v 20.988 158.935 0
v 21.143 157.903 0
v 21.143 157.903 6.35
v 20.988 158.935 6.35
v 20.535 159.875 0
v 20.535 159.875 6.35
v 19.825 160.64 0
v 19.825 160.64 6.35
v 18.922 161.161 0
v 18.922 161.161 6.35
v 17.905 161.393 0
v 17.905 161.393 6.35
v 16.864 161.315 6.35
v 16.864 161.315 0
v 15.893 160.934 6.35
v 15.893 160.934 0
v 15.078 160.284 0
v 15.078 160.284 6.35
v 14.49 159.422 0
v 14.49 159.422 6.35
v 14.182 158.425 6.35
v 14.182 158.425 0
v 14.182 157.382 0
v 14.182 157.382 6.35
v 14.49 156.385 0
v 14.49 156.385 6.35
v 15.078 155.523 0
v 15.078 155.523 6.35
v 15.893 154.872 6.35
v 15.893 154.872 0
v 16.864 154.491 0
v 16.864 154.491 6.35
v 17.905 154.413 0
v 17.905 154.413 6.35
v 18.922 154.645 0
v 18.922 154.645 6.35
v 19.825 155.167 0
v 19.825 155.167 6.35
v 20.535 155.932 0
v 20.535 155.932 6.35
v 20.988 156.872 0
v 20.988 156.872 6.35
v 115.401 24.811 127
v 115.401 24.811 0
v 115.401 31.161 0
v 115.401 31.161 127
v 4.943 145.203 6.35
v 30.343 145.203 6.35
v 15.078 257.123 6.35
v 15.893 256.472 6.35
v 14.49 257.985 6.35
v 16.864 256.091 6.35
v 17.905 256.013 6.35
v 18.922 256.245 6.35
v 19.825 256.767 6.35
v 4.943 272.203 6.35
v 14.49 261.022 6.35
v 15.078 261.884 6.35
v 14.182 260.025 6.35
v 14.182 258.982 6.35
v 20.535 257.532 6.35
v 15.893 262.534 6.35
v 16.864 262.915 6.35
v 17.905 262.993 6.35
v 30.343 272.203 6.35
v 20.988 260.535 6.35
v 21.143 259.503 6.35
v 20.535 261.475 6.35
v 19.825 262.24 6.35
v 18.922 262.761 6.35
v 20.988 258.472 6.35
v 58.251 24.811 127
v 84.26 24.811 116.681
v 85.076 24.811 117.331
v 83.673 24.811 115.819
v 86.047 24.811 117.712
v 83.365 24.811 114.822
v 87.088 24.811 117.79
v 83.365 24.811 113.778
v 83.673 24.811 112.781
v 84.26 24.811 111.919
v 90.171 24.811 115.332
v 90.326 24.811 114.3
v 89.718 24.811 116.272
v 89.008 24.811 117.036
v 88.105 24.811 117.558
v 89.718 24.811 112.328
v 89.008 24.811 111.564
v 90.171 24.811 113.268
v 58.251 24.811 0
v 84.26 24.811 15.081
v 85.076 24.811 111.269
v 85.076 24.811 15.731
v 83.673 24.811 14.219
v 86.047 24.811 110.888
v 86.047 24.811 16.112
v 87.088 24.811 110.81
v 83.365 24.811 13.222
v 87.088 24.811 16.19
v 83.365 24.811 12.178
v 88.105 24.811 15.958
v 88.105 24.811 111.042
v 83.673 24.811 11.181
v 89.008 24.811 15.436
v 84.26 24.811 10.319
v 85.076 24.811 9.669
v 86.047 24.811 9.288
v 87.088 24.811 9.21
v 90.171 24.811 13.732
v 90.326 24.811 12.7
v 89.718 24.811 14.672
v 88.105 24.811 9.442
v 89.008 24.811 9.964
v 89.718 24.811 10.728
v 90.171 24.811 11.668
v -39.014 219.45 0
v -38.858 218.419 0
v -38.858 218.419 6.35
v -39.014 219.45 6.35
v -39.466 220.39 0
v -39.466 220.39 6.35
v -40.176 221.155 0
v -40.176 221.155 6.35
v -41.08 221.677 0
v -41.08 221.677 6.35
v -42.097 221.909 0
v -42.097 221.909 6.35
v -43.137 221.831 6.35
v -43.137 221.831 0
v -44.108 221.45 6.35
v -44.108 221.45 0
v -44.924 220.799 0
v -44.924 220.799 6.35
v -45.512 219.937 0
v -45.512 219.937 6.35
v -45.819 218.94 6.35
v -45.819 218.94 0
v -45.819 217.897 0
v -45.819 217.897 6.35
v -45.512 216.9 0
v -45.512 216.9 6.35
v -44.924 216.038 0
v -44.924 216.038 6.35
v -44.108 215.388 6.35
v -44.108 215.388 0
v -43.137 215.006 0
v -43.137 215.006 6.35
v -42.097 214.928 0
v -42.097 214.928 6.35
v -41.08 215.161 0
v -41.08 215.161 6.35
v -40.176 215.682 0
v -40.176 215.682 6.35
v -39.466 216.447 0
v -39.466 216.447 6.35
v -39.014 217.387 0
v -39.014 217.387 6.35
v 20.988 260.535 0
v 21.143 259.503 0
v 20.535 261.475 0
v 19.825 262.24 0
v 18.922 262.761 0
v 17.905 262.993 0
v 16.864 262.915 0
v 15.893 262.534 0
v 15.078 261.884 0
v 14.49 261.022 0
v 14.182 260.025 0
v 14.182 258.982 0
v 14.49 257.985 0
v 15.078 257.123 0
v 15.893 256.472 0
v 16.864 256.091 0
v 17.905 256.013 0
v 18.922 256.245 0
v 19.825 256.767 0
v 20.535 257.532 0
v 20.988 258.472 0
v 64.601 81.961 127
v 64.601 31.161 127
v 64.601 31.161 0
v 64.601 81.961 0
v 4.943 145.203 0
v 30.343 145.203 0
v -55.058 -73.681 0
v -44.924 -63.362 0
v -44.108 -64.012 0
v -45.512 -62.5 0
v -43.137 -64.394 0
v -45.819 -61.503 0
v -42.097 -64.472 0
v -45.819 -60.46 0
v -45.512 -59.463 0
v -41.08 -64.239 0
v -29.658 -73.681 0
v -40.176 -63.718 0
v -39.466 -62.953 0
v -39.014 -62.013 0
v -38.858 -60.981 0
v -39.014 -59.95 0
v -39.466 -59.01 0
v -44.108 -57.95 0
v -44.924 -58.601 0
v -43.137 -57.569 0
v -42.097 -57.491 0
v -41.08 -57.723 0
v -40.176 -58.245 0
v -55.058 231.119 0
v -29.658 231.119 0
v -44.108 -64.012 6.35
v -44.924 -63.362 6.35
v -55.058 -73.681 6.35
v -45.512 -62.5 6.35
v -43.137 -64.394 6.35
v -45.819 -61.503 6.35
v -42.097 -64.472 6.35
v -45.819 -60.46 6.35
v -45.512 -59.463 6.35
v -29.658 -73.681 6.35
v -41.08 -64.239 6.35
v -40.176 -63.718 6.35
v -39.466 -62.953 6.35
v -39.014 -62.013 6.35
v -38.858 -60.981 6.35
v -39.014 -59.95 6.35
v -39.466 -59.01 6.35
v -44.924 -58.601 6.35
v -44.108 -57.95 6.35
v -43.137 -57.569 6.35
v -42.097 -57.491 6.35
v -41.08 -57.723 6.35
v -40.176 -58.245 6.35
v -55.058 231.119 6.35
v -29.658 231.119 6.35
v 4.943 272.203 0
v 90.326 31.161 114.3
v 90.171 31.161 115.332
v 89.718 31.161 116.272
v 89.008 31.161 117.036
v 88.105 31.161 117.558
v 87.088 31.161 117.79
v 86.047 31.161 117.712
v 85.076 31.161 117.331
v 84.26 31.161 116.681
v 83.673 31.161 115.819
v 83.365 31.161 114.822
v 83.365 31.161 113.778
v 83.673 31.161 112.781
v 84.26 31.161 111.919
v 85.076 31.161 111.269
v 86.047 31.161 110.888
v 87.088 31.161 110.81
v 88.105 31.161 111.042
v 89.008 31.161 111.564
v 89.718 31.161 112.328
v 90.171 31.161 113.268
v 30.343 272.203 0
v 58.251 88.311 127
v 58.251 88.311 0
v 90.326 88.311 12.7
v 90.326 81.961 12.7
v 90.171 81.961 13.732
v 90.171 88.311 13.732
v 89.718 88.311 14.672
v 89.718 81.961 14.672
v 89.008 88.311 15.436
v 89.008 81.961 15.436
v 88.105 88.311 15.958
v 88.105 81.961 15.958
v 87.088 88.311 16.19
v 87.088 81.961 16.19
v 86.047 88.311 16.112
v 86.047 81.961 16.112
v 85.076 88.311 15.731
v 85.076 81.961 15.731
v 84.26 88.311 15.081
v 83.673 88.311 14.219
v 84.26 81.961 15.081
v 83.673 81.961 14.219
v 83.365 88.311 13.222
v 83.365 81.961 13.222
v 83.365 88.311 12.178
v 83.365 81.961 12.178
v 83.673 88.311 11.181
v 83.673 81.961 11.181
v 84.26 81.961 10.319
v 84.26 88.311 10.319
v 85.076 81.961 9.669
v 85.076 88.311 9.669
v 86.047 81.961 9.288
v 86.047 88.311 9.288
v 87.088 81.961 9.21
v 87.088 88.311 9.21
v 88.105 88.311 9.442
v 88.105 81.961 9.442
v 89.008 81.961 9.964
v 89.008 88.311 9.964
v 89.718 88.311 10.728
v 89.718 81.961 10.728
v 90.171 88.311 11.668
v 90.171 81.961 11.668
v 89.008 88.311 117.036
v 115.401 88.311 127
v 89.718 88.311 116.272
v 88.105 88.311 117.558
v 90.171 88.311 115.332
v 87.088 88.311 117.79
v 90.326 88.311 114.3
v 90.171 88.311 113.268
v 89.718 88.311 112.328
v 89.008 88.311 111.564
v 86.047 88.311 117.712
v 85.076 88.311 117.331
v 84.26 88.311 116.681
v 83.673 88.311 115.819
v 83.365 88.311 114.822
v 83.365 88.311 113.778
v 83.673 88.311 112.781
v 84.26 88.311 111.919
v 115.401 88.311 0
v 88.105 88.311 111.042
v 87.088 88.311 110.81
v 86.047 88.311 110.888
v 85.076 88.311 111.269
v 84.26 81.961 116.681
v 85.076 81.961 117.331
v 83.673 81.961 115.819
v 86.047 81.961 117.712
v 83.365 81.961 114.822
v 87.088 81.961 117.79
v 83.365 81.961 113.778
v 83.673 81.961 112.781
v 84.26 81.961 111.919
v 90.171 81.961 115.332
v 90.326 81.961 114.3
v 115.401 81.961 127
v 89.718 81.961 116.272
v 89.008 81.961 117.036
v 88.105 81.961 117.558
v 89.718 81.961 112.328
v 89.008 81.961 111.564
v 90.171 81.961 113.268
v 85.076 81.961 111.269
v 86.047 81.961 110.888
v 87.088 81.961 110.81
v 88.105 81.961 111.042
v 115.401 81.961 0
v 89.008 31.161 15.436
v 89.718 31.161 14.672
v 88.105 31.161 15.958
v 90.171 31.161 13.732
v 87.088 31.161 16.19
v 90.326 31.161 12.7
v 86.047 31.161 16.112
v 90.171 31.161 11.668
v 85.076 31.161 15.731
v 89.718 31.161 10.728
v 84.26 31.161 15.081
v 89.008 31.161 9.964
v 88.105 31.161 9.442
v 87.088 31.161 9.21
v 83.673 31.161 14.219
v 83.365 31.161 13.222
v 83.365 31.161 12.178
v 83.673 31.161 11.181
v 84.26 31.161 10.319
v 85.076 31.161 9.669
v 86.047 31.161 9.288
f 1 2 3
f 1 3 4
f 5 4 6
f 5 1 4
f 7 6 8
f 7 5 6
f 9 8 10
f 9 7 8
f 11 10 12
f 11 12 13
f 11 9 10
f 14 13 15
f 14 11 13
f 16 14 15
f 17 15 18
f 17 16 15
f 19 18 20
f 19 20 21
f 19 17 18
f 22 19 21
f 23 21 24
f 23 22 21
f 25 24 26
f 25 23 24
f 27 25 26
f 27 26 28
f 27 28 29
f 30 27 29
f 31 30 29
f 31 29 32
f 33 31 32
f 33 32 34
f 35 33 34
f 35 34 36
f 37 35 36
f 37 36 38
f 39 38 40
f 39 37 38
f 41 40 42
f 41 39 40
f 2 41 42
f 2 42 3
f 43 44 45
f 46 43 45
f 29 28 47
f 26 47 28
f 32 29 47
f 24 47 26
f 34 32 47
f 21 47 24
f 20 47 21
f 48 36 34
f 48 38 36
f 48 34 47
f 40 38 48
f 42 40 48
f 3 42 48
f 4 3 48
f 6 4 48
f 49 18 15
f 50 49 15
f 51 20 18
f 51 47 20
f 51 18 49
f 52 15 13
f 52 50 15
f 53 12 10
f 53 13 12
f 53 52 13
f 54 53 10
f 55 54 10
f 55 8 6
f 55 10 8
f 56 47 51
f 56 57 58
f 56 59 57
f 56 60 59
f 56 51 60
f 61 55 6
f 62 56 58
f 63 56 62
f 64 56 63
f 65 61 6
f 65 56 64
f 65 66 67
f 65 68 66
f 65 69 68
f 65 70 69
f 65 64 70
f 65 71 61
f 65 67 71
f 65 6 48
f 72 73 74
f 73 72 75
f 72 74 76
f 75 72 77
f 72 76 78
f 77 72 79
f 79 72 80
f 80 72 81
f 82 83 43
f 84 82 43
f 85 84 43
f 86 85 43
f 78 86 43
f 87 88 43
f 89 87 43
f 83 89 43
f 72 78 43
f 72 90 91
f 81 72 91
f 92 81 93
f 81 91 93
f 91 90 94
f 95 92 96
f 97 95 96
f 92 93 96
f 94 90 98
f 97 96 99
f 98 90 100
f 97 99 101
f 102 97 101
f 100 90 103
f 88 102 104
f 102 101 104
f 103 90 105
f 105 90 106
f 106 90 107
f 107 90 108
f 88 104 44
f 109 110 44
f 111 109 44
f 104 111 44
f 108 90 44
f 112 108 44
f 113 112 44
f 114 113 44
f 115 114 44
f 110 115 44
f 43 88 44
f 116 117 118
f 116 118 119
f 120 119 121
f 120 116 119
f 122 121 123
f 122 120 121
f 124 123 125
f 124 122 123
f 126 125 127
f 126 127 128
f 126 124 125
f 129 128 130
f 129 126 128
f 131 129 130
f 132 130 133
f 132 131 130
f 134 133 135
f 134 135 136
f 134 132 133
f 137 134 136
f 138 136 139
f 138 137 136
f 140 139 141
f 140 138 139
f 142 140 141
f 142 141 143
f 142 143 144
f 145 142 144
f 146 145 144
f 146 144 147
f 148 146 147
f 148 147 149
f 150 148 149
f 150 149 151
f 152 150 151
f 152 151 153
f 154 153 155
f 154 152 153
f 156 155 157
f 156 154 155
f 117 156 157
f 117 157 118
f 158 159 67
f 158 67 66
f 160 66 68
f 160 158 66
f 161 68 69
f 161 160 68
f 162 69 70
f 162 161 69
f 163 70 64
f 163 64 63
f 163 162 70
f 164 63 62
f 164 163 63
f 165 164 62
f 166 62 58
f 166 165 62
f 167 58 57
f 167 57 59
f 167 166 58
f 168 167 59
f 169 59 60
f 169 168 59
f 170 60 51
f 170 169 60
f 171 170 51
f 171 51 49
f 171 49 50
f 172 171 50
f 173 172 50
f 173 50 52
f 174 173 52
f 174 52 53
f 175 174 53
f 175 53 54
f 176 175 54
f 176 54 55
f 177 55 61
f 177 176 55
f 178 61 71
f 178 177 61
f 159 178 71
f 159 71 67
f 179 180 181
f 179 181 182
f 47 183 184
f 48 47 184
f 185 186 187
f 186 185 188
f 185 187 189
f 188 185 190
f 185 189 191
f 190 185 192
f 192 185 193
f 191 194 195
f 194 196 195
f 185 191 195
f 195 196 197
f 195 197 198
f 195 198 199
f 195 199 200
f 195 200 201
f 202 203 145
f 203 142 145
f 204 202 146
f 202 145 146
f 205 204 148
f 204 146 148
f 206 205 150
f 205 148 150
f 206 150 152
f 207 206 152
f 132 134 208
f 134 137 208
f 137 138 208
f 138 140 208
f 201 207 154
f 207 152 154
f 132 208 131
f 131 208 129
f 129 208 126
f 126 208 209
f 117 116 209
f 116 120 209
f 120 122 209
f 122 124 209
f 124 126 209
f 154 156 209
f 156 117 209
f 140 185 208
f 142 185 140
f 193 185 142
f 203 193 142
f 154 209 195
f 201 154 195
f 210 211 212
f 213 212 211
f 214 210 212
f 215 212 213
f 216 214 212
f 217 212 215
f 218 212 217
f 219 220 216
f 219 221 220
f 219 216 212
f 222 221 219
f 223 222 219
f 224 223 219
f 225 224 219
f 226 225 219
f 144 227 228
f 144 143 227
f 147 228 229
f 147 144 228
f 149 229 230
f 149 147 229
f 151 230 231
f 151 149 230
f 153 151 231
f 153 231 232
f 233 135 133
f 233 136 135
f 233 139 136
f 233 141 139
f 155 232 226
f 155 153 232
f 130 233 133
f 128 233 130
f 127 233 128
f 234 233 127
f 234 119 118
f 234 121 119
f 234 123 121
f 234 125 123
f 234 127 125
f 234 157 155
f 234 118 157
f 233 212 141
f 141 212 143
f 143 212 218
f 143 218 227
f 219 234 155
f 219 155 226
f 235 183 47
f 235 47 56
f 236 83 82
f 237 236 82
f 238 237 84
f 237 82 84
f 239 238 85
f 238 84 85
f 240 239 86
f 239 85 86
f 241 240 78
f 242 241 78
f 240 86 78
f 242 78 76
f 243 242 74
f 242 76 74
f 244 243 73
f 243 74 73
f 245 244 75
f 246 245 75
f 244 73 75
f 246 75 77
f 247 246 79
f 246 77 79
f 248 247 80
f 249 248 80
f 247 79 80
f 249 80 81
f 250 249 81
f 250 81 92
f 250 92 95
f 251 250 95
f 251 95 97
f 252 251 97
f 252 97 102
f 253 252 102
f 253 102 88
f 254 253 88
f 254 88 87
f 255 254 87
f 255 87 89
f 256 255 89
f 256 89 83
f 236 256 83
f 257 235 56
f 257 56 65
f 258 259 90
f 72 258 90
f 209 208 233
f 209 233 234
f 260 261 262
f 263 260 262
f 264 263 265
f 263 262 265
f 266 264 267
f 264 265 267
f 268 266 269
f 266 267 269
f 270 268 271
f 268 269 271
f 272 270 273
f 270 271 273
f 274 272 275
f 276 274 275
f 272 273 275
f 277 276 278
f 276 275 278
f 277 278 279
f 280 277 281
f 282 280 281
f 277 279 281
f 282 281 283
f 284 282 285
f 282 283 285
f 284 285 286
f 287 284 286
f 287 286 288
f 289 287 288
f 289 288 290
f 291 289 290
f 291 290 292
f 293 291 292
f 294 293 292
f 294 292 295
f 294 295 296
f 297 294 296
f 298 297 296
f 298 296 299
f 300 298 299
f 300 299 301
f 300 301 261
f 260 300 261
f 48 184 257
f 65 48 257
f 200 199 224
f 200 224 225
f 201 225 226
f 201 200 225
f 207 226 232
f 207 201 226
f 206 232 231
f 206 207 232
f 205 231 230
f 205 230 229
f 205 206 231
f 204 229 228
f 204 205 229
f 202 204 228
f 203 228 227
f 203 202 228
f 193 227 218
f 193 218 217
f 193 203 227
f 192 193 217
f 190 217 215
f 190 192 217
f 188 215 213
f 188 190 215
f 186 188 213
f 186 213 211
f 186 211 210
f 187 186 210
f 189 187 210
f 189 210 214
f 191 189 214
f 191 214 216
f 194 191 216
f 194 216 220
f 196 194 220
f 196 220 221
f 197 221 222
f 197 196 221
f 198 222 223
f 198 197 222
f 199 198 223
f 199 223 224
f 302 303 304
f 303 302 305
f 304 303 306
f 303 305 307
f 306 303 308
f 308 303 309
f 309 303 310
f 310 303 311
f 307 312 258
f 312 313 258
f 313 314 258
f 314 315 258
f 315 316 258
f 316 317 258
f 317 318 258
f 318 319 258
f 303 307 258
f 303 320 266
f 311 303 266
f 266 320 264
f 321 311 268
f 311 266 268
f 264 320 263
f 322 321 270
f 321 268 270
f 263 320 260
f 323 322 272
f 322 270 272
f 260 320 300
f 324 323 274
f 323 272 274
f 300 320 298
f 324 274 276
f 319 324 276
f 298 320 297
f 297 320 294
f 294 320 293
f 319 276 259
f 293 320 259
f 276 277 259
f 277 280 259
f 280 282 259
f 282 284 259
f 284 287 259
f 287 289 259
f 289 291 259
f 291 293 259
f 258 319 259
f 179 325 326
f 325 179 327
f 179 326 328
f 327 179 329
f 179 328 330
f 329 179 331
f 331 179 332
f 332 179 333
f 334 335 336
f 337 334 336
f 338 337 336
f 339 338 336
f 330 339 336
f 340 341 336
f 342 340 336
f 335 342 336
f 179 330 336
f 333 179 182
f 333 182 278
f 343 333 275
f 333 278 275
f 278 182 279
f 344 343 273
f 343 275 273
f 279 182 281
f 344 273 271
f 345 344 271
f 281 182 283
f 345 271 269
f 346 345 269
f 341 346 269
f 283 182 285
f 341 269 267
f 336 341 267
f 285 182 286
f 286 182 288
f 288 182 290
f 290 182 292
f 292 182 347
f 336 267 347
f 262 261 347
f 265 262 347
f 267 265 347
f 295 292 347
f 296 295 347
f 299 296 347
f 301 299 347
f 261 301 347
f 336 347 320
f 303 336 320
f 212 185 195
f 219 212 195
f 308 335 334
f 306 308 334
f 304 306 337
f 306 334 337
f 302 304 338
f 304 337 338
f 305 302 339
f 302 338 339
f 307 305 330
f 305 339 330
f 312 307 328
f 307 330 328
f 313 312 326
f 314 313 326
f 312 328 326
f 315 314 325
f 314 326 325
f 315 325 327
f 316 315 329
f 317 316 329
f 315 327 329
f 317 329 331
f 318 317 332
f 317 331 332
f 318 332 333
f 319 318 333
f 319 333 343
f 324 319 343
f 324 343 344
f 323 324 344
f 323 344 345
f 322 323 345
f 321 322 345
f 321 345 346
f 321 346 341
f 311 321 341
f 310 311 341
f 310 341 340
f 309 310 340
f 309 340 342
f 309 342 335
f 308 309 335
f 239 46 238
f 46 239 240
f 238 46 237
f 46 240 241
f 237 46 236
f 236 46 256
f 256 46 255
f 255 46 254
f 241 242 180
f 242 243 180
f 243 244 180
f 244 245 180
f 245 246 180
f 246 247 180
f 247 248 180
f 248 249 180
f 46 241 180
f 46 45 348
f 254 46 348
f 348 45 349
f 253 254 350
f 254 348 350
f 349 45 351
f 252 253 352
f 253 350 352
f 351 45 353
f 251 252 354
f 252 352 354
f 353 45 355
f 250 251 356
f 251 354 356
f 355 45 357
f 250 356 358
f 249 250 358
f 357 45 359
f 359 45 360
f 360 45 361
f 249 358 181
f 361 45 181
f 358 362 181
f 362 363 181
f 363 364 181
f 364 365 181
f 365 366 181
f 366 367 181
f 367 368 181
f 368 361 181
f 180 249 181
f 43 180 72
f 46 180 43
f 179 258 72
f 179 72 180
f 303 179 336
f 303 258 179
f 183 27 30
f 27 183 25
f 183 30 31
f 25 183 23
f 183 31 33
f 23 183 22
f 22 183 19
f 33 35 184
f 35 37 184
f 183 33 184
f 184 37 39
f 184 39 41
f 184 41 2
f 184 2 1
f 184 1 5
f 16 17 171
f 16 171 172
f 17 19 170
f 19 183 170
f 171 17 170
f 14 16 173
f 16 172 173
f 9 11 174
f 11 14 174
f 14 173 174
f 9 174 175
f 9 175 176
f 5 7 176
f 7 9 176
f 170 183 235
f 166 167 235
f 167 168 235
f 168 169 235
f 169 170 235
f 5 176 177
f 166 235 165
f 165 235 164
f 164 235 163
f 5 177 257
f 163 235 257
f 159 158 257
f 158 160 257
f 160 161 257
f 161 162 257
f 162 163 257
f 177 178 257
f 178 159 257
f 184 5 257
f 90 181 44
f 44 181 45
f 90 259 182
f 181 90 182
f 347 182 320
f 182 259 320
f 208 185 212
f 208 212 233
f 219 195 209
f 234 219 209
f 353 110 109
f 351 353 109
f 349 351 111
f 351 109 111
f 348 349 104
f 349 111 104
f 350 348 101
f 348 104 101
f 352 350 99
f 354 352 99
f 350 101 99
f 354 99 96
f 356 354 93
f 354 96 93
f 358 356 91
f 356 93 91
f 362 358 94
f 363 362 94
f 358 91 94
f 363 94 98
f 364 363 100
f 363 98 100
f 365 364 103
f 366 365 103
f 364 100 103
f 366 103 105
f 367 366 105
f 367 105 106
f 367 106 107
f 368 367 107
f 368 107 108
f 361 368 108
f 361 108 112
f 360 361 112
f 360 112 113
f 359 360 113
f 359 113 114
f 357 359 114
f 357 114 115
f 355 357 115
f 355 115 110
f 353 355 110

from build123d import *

# Parameters (mm, degrees)
F0_W     = 25.4
F0_H     = 304.8
F0_R     = 3.5
F0_H_2   = 127
F1_DEPTH = 6.35
F2_DEPTH = 127
F3_R     = 3.5
F4_DEPTH = 91.44


with BuildPart() as f1:
    # F0 (on Top) → F1 (new body)
    with BuildSketch(Plane.XY):
        with Locations((-42.358236, 78.718602)):
            Rectangle(F0_W, F0_H)
        with Locations((-42.358236, -60.981398)):
            Circle(F0_R, mode=Mode.SUBTRACT)
        with Locations((-42.358236, 218.418602)):
            Circle(F0_R, mode=Mode.SUBTRACT)
        with Locations((17.643214, 208.703248)):
            Rectangle(F0_W, F0_H_2)
        with Locations((17.643214, 157.903248)):
            Circle(F0_R, mode=Mode.SUBTRACT)
        with Locations((17.643214, 259.503248)):
            Circle(F0_R, mode=Mode.SUBTRACT)
    extrude(amount=F1_DEPTH)


with BuildPart() as f2:
    # F0 (on Top) → F2 (new body)
    with BuildSketch(Plane.XY):
        Polygon((115.401124, 88.311218), (58.251124, 88.311218), (58.251124, 24.811218), (115.401124, 24.811218), (115.401124, 31.161218), (64.601124, 31.161218), (64.601124, 81.961218), (115.401124, 81.961218), align=None)
    extrude(amount=F2_DEPTH)

    # F3 (on face) → F4 (cut)
    with BuildSketch(Plane.XZ.offset(-24.811218)):
        with Locations((86.826124, 114.3)):
            Circle(F3_R)
        with Locations((86.826124, 12.7)):
            Circle(F3_R)
    extrude(amount=-F4_DEPTH, mode=Mode.SUBTRACT)


solid = Compound([f1.part, f2.part])
